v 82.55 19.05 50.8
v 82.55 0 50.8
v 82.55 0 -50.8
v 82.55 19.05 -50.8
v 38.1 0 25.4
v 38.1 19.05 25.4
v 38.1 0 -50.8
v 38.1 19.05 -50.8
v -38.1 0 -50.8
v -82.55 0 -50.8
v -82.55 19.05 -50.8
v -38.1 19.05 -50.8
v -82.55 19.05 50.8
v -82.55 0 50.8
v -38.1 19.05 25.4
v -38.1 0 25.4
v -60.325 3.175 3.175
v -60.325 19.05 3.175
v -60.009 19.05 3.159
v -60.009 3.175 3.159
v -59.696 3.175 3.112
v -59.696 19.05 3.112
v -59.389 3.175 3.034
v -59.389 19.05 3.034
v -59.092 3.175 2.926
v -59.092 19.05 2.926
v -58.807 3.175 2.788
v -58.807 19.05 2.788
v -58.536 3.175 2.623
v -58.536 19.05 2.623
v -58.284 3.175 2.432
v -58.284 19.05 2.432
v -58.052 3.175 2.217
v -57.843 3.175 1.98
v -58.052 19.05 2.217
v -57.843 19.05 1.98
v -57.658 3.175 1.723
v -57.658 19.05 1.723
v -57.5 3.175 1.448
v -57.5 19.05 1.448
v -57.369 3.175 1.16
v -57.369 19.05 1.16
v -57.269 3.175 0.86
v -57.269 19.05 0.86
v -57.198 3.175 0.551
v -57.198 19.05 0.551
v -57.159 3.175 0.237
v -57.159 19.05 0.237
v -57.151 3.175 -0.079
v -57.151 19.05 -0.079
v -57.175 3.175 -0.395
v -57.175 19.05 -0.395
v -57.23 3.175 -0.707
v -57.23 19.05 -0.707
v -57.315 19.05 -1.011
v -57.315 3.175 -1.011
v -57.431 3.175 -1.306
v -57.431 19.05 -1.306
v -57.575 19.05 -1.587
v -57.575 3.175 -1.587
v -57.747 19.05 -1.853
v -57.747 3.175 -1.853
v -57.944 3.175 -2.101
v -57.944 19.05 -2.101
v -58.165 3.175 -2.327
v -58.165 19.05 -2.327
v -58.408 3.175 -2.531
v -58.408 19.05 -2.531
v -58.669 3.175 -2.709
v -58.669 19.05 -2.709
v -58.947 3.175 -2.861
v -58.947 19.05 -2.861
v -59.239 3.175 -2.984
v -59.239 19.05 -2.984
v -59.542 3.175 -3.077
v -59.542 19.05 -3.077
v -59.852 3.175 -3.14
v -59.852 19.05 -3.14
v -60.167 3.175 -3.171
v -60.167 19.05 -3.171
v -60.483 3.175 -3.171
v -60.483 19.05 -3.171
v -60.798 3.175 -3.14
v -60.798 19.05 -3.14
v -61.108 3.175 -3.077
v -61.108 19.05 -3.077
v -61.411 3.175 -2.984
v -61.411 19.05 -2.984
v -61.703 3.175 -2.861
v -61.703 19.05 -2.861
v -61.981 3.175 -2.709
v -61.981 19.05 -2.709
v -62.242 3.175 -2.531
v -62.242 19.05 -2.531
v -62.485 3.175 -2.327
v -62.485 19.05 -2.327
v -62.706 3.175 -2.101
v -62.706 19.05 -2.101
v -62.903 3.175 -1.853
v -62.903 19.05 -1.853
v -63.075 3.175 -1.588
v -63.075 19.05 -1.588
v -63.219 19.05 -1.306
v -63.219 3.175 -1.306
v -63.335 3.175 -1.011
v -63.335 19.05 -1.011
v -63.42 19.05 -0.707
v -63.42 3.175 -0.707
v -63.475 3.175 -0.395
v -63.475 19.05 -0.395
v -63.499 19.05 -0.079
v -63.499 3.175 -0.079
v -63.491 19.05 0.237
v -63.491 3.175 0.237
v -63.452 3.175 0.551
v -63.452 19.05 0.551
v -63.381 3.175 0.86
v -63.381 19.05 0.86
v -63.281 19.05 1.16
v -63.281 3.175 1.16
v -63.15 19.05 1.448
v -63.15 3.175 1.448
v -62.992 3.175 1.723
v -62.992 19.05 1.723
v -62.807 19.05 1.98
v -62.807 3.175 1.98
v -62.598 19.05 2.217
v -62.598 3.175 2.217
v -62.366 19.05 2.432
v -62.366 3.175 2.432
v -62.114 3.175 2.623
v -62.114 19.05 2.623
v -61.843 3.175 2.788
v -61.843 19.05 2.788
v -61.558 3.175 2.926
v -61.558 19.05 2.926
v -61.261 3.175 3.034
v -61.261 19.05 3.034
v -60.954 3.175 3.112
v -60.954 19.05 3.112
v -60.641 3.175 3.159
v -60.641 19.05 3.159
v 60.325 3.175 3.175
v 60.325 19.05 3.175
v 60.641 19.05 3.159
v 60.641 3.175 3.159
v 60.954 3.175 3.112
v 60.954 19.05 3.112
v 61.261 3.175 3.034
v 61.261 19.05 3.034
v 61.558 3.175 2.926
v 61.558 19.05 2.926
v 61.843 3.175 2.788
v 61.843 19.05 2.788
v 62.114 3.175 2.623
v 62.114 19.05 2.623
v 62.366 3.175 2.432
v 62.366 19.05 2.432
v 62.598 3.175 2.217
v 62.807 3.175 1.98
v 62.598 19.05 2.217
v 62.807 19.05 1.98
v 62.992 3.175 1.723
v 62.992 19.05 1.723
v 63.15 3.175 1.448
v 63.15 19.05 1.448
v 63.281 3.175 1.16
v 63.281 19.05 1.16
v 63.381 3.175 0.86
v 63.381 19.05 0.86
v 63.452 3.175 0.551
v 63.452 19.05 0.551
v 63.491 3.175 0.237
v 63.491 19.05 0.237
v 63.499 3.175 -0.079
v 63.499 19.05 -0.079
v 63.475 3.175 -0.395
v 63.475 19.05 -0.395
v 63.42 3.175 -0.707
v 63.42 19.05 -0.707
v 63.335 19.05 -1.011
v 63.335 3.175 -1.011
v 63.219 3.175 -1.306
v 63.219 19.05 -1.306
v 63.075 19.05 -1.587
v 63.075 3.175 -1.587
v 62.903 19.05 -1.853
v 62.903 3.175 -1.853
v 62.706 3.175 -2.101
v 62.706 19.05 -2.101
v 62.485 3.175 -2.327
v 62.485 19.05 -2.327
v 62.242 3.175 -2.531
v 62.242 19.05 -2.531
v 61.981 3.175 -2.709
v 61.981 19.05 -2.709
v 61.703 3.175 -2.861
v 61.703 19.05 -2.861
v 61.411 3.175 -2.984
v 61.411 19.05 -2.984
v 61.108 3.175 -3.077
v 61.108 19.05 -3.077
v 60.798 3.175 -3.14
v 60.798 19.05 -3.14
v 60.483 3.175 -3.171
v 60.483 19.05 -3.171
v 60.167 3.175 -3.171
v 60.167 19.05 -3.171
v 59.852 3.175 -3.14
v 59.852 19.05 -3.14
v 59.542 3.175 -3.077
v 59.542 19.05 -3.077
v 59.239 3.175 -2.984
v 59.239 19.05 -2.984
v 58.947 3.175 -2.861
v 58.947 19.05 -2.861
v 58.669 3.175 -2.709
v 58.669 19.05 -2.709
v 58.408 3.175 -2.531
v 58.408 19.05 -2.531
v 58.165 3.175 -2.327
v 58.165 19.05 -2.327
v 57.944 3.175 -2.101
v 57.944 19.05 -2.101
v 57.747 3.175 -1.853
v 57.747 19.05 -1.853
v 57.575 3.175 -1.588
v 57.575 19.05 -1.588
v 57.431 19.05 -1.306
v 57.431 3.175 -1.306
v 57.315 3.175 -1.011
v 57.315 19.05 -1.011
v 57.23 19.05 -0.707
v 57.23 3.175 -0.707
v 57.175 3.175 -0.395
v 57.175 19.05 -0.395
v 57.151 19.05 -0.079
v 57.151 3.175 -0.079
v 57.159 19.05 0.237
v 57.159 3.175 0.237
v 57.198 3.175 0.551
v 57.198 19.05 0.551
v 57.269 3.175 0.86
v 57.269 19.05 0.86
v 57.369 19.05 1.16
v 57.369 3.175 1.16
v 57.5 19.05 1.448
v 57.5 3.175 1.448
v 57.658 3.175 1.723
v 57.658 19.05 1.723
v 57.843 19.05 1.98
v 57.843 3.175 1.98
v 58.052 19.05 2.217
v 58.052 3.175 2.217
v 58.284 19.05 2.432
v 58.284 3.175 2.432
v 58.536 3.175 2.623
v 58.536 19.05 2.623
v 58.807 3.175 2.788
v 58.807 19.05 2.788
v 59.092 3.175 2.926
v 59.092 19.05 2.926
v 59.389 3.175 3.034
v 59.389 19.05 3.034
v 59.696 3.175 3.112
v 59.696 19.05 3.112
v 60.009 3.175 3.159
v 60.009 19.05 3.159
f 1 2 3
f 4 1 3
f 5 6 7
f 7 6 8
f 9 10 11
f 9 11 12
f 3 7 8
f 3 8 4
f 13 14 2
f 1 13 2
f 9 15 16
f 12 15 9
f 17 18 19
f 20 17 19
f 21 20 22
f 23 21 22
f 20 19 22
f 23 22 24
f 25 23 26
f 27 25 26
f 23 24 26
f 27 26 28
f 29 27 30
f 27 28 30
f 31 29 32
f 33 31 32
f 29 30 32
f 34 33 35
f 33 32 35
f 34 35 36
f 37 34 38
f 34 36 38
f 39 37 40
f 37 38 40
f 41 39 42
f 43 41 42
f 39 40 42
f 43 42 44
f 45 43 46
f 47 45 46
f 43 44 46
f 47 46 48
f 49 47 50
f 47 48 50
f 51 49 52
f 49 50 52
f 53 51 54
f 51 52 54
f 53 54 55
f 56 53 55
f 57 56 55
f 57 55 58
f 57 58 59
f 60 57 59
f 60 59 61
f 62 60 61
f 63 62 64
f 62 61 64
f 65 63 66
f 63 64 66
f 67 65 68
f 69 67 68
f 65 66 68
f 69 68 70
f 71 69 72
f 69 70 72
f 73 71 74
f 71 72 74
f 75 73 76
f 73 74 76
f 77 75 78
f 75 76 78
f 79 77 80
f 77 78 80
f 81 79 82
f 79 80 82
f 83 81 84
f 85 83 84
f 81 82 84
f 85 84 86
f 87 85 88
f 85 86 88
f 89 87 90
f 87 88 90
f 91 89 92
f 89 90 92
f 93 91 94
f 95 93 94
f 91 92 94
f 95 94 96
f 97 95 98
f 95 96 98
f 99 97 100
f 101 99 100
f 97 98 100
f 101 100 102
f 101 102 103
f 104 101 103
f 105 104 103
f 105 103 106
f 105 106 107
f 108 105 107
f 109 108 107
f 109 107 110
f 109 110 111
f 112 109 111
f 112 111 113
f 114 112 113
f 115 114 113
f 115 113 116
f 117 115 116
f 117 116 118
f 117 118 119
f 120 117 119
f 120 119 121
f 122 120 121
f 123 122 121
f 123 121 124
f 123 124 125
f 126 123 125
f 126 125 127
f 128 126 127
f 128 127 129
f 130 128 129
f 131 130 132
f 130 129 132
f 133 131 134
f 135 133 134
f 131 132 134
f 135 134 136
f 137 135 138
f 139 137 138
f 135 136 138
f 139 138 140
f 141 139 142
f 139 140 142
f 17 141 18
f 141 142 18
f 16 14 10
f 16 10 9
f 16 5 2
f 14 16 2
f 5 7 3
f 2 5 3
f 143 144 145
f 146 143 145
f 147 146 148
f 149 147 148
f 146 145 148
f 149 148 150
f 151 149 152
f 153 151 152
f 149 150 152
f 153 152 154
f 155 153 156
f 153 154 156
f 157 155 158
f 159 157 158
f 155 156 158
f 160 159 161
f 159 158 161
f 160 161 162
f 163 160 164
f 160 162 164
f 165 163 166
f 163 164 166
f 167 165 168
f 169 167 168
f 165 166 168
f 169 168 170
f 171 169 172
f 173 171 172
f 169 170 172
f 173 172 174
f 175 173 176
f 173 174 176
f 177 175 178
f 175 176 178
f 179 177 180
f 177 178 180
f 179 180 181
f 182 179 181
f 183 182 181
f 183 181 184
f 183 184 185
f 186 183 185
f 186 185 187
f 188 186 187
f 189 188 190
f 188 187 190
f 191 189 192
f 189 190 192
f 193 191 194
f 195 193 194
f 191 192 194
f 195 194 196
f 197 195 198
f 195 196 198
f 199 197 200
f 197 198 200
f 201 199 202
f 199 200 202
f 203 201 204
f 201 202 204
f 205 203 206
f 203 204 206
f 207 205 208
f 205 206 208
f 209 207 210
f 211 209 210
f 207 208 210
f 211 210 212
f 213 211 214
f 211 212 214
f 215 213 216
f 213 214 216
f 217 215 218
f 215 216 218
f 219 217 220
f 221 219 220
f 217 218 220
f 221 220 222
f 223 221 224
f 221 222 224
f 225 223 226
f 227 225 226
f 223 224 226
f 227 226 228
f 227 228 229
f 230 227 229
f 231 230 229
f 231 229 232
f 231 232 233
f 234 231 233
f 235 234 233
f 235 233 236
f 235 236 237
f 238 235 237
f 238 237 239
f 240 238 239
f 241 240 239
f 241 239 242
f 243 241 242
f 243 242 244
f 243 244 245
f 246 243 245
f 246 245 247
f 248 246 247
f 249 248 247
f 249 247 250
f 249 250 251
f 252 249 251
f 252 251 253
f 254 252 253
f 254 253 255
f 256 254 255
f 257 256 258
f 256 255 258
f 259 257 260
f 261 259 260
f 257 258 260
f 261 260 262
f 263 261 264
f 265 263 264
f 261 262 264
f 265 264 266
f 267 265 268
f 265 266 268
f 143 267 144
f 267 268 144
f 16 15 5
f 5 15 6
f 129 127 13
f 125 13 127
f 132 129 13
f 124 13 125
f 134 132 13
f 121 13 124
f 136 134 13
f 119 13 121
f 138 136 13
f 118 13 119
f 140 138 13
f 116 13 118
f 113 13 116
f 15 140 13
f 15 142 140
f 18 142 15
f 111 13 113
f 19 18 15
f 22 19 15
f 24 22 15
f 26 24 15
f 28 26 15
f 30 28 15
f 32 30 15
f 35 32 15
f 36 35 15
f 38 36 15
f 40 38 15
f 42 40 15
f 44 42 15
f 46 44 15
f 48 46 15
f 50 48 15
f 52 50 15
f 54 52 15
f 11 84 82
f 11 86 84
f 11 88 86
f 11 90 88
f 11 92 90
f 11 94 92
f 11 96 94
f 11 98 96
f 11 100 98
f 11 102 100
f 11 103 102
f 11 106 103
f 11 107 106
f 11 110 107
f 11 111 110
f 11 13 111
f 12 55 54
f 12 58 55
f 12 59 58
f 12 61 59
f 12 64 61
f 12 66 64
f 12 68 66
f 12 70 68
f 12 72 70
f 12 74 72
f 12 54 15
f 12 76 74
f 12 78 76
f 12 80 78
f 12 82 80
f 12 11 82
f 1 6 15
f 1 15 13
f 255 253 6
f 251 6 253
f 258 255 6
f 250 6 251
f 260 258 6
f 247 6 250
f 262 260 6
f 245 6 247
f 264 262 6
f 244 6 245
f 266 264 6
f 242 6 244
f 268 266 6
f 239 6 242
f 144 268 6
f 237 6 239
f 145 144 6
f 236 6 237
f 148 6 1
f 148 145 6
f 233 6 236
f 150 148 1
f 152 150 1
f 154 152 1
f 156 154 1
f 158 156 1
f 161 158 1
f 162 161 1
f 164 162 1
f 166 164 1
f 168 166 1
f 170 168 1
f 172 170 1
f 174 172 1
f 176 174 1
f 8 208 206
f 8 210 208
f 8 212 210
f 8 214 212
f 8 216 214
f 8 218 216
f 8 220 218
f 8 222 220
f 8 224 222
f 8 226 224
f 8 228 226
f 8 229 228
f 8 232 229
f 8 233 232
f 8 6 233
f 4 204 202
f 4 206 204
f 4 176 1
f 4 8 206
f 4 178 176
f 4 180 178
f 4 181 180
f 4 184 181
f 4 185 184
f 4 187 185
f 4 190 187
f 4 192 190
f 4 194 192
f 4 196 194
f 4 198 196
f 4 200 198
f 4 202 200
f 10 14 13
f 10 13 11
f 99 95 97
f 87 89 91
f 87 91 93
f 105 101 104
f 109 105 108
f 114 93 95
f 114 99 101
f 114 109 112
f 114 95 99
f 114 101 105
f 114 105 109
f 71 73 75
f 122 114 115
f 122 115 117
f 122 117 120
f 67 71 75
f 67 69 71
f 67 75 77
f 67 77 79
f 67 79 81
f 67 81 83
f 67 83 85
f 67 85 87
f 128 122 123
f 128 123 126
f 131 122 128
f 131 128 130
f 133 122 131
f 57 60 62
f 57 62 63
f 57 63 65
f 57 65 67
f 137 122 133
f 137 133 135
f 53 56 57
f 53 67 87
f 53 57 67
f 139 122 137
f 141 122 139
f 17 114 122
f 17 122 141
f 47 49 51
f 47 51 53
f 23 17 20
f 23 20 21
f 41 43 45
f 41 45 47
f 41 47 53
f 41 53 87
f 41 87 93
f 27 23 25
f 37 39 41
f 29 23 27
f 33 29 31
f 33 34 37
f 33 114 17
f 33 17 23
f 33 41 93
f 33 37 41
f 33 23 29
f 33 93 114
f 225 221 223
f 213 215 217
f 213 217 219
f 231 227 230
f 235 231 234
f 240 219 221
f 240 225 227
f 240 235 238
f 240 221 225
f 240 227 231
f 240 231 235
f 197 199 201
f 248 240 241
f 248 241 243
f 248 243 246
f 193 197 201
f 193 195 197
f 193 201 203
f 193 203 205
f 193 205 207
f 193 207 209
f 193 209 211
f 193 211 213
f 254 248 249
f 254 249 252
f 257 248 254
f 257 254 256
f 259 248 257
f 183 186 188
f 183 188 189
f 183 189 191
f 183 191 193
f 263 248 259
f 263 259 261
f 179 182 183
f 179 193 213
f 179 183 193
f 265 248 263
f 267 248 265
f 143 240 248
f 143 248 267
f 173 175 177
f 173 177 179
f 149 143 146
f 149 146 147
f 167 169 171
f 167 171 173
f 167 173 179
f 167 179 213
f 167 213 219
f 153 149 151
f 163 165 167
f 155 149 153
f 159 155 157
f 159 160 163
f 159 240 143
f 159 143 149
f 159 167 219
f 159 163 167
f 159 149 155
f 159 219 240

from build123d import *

# Parameters (mm, degrees)
SKETCH1_W           = 165.1
SKETCH1_H           = 101.6
BOSS_EXTRUDE1_DEPTH = 19.05
SKETCH2_W           = 76.2
SKETCH2_H           = 76.2
CUT_EXTRUDE1_DEPTH  = 99.782817332
SKETCH3_R           = 3.175
CUT_EXTRUDE2_DEPTH  = 15.875


with BuildPart() as part:
    # Sketch1 → Boss-Extrude1 (new body)
    with BuildSketch(Plane(origin=(0, 0, 0), x_dir=(1, 0, 0), z_dir=(0, 1, 0))):
        Rectangle(SKETCH1_W, SKETCH1_H)
    extrude(amount=BOSS_EXTRUDE1_DEPTH)

    # Sketch2 → Cut-Extrude1 (cut, through all)
    with BuildSketch(Plane(origin=(0, 19.05, 0), x_dir=(1, 0, 0), z_dir=(0, 1, 0))):
        with Locations((0, 12.7)):
            Rectangle(SKETCH2_W, SKETCH2_H)
    extrude(amount=-CUT_EXTRUDE1_DEPTH, mode=Mode.SUBTRACT)

    # Sketch3 → Cut-Extrude2 (cut)
    with BuildSketch(Plane(origin=(0, 19.05, 0), x_dir=(1, 0, 0), z_dir=(0, 1, 0))):
        with Locations(Location((-60.325, 0, 0), (0, 0, 270))):
            Circle(SKETCH3_R)
        with Locations(Location((60.325, 0, 0), (0, 0, 270))):
            Circle(SKETCH3_R)
    extrude(amount=-CUT_EXTRUDE2_DEPTH, mode=Mode.SUBTRACT)


solid = part.part
